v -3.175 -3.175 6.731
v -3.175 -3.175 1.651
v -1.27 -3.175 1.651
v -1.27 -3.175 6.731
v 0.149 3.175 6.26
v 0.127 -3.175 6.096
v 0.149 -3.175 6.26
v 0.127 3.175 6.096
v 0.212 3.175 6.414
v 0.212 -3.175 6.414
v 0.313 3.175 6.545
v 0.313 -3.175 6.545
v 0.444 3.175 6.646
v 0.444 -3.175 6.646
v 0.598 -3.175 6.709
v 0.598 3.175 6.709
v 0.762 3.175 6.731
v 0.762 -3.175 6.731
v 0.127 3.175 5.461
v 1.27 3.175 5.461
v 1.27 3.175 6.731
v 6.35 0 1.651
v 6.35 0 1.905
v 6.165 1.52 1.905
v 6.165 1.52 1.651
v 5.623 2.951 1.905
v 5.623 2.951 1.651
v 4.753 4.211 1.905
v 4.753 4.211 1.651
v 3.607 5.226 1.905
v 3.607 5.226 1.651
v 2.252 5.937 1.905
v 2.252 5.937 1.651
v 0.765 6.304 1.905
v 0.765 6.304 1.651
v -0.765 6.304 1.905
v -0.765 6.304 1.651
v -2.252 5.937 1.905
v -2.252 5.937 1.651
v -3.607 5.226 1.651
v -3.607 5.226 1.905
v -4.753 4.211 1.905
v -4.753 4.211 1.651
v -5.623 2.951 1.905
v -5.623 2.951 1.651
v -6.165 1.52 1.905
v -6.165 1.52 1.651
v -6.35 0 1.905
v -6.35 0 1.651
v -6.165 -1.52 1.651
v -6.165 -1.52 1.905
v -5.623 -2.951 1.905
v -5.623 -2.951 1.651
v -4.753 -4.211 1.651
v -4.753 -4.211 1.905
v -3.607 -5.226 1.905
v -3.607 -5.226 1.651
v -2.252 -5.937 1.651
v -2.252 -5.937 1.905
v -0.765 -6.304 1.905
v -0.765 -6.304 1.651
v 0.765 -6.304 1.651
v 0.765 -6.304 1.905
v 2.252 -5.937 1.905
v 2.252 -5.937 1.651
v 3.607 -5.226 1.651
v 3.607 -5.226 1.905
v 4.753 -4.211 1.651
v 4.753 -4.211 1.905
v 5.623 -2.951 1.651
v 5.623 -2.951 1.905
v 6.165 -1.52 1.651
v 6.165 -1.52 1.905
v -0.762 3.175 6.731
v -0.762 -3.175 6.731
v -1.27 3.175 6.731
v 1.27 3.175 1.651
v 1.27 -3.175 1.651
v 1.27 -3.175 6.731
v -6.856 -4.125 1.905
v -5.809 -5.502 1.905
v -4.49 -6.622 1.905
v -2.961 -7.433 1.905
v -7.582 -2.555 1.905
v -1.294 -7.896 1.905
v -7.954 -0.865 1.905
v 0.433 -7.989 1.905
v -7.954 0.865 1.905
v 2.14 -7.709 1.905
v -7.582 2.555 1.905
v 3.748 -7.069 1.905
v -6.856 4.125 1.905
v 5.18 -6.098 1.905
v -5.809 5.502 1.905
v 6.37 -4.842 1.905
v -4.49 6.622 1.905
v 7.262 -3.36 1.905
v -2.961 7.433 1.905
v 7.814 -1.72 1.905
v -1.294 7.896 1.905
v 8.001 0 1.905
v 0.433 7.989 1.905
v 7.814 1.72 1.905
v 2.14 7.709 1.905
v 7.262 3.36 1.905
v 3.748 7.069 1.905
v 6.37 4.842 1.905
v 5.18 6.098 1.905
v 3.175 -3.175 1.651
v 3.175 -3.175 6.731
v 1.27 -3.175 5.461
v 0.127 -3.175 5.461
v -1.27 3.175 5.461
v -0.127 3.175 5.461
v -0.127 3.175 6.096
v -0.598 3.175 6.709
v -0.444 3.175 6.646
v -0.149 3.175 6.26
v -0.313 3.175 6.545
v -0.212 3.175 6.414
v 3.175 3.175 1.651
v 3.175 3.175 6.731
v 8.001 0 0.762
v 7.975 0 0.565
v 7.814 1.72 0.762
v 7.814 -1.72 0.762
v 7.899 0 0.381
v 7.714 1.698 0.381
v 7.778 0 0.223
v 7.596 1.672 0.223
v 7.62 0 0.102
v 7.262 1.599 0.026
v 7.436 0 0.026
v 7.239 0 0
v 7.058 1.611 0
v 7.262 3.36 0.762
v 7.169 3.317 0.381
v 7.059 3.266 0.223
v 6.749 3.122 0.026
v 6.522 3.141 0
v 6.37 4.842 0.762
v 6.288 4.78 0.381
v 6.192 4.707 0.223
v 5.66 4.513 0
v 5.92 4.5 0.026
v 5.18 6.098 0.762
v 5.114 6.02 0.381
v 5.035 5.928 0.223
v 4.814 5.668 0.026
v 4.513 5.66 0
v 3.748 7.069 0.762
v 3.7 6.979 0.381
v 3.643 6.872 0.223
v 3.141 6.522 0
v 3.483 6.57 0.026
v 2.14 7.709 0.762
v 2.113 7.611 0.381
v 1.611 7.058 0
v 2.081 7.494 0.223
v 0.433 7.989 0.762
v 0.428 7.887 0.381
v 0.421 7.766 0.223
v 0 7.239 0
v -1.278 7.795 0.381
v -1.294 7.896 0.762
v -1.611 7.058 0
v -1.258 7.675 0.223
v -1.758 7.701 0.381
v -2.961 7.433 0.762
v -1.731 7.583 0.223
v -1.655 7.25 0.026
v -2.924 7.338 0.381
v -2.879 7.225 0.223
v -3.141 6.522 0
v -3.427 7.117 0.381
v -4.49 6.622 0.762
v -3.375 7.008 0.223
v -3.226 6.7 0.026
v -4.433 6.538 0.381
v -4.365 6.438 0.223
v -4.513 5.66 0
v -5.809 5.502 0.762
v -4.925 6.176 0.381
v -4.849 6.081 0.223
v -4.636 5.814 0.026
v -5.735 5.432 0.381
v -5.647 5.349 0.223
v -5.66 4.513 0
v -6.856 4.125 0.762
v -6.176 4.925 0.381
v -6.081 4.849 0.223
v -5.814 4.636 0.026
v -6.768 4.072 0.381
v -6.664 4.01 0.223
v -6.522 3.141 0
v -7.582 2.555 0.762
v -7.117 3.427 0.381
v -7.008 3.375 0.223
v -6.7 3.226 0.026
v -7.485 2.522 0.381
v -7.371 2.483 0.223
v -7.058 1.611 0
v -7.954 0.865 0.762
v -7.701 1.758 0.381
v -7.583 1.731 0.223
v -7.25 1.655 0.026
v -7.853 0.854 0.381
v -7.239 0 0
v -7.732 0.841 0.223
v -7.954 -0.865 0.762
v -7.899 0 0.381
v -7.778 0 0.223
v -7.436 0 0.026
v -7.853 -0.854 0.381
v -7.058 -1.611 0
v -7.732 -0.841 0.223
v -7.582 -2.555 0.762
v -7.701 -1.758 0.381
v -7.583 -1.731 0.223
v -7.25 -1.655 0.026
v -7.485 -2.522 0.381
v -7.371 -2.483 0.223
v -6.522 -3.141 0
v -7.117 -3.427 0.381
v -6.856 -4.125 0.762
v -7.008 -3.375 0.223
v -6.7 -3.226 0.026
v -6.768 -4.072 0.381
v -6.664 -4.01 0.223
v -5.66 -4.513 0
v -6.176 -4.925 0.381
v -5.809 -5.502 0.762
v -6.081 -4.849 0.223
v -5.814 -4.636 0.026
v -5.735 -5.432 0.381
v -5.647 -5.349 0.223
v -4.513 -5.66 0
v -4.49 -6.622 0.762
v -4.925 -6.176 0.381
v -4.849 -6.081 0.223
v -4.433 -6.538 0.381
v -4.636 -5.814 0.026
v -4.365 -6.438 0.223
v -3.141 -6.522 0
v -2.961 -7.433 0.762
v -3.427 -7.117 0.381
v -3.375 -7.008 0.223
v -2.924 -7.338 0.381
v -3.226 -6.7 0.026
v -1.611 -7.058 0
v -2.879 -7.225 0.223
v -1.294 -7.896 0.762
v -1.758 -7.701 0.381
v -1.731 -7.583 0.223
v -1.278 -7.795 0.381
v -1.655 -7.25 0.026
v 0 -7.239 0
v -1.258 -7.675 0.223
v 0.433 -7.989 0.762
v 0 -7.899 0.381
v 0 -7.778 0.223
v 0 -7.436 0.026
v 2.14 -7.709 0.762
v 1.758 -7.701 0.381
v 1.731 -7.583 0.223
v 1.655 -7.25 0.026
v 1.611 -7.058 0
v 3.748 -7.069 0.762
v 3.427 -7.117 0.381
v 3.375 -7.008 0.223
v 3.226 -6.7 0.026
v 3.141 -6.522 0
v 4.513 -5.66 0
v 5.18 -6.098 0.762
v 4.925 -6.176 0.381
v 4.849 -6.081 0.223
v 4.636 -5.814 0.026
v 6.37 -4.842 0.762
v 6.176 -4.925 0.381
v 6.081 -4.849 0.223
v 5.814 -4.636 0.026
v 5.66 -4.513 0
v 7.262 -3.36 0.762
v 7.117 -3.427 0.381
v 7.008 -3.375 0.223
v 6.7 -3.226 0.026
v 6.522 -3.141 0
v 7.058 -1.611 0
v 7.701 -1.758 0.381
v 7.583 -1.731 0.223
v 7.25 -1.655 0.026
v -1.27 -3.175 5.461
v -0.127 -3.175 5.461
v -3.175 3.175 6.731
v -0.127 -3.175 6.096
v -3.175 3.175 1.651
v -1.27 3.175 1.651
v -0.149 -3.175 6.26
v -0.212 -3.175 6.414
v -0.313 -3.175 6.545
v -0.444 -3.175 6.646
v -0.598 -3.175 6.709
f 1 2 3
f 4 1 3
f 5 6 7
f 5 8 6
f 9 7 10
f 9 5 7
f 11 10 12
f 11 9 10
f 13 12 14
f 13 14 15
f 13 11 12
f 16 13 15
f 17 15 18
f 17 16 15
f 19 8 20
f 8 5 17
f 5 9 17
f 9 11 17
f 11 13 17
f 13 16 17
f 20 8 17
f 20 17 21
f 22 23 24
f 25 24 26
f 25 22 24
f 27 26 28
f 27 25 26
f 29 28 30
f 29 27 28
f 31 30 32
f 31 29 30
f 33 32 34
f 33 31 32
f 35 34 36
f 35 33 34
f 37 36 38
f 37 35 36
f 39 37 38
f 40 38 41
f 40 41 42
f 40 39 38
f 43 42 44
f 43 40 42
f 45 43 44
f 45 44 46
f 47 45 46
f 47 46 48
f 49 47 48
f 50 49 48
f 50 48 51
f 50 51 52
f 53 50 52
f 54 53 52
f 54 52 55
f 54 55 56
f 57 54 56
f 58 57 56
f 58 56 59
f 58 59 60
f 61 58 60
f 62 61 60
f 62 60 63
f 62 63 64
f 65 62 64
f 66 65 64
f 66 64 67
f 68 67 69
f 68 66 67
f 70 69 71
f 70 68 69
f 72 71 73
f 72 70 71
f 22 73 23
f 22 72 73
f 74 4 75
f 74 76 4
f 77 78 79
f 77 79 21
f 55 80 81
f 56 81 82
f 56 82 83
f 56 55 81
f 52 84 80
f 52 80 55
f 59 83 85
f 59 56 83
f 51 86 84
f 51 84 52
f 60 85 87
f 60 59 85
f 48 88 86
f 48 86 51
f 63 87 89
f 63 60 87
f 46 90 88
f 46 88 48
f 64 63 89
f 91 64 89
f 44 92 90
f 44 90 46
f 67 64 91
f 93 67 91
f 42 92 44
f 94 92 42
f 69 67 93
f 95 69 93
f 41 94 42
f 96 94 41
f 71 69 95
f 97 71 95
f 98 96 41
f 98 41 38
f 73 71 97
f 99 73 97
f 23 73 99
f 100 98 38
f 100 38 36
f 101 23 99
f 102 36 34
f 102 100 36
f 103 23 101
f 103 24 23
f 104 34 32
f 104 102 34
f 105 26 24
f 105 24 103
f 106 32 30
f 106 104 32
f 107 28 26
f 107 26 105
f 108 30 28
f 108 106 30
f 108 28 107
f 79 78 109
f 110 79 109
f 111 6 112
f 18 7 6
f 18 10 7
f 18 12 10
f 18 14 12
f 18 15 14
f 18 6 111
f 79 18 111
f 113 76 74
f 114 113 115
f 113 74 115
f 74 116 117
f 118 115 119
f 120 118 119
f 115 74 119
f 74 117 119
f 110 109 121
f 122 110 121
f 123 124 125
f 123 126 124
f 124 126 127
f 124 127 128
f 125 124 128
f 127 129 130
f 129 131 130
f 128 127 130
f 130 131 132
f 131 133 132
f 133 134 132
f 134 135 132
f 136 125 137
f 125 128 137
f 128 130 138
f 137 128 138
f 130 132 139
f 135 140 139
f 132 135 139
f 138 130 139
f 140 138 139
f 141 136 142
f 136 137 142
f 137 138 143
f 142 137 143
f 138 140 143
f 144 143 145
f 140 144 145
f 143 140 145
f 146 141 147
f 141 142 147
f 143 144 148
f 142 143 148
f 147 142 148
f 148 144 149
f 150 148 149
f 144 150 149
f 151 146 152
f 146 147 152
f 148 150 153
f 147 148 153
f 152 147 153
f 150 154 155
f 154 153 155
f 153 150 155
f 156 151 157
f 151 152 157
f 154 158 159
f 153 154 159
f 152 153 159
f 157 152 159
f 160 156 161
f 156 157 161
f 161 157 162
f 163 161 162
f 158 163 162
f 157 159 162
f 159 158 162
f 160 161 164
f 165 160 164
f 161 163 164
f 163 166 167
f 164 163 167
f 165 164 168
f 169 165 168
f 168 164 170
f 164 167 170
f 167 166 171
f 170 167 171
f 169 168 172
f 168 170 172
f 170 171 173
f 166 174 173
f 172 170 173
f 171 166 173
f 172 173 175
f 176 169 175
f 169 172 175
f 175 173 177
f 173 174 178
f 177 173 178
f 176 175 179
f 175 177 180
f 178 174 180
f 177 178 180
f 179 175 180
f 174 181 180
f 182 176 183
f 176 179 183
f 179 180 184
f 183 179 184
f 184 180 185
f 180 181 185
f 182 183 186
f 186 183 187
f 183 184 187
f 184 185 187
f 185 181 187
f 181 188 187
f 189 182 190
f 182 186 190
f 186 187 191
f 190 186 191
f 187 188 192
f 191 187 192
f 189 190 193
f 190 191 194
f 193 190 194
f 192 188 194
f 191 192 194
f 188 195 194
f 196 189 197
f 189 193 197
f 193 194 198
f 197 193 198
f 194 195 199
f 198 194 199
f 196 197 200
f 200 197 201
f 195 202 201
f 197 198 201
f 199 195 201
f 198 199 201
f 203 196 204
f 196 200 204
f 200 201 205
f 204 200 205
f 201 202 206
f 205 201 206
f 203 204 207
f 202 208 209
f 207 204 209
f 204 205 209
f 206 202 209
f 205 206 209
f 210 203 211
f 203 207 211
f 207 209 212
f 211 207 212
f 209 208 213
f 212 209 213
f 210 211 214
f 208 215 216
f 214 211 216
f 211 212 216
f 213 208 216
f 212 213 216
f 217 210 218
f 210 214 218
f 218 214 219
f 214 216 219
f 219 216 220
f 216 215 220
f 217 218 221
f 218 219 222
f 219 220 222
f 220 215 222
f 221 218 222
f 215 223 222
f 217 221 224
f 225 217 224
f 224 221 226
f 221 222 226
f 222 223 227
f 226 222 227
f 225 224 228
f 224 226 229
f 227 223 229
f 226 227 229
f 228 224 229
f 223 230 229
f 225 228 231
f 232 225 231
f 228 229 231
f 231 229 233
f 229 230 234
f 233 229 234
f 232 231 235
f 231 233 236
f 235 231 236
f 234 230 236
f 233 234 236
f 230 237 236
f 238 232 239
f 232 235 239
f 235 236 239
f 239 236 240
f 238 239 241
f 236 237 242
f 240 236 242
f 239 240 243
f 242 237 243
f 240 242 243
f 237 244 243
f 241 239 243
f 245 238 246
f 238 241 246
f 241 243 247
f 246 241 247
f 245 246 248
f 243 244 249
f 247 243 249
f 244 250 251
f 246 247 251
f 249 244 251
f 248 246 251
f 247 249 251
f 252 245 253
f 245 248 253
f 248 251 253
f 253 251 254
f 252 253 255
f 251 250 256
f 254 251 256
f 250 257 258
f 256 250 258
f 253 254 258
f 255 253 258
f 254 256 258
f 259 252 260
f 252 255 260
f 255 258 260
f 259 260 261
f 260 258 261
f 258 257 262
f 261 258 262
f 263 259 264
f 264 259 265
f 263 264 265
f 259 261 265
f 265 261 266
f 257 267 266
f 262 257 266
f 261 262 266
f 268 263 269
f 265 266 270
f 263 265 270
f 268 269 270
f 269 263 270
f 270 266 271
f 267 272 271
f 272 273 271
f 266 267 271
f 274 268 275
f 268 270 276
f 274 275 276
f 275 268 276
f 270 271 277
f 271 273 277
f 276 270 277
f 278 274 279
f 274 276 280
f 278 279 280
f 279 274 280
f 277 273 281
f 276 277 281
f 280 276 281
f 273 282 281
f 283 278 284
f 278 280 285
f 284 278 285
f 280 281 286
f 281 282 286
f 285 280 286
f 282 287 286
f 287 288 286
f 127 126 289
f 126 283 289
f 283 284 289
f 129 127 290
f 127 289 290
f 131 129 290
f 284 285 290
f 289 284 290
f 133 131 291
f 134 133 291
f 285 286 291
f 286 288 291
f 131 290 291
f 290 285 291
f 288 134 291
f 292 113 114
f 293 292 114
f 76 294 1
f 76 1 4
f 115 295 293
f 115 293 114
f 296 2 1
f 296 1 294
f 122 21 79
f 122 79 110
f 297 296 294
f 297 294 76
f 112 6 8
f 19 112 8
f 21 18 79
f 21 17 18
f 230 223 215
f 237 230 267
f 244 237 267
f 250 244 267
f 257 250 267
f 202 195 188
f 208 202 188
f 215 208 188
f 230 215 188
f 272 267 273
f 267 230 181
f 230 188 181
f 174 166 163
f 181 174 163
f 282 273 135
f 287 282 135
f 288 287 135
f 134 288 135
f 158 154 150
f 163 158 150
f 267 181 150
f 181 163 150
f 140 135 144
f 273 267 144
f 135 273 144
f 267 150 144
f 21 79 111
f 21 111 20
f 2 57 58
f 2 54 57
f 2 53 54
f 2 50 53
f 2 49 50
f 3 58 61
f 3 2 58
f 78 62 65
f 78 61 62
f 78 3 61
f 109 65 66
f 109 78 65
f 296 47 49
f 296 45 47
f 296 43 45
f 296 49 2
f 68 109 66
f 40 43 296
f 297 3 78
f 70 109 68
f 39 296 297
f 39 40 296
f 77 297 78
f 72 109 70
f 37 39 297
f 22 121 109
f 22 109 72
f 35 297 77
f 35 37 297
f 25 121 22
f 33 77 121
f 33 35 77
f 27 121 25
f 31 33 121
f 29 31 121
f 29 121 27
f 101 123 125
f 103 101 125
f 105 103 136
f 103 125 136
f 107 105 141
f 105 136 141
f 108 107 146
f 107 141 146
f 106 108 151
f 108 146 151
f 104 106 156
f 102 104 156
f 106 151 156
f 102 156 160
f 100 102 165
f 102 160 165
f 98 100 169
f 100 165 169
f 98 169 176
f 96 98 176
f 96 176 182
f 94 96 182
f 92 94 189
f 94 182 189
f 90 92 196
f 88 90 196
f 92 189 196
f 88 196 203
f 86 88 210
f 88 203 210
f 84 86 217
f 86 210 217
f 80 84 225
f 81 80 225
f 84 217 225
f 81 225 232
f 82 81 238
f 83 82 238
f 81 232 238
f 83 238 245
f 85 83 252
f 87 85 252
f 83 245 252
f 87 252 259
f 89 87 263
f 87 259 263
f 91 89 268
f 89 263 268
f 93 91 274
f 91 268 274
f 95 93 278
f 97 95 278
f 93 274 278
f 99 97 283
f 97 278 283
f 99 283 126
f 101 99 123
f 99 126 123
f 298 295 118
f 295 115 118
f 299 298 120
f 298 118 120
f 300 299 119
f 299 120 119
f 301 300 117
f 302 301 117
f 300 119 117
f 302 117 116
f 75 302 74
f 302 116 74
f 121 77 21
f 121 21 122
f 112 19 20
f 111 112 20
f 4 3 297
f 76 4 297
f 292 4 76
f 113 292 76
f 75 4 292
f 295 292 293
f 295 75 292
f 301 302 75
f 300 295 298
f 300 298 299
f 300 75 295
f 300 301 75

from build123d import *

# Parameters (mm, degrees)
F0_R     = 8.001
F1_DEPTH = 1.905
F2_T     = -1.651
F3_W     = 1.905
F3_H     = 6.35
F7_DEPTH = 5.08
F8_W     = 1.143
F8_H     = 6.35
F4_W     = 1.143
F4_H     = 6.35
F9_DEPTH = 1.27
F5_R     = 0.762
F6_R     = 0.635


with BuildPart() as f1:
    # F0 (on Top) → F1 (new body)
    with BuildSketch(Plane.XY):
        Circle(F0_R)
    extrude(amount=F1_DEPTH)

    # F2
    f2_openings = [f1.faces().sort_by_distance(p)[0] for p in [
        (0, 0, 1.905),
    ]]
    offset(amount=F2_T, openings=f2_openings)

    # F3 (on face) → F7 (join)
    with BuildSketch(Plane.XY.offset(1.651)):
        with Locations((2.2225, 0)):
            Rectangle(F3_W, F3_H)
        with Locations((-2.2225, 0)):
            Rectangle(F3_W, F3_H)
    extrude(amount=F7_DEPTH)

    # F5
    f5_edges = [f1.edges().sort_by_distance(p)[0] for p in [
        (-8.001, 0, 0),
    ]]
    fillet(f5_edges, radius=F5_R)


with BuildPart() as f9:
    # F8 (on face) + F4 (on face) → F9 (new body)
    with BuildSketch(Plane.XY.offset(6.731)):
        with Locations((0.6985, 0)):
            Rectangle(F8_W, F8_H)
    with BuildSketch(Plane.XY.offset(6.731)):
        with Locations((-0.6985, 0)):
            Rectangle(F4_W, F4_H)
    extrude(amount=-F9_DEPTH)

    # F6
    f6_edges = [f9.edges().sort_by_distance(p)[0] for p in [
        (-0.127, 0, 6.731),
        (0.127, 0, 6.731),
    ]]
    fillet(f6_edges, radius=F6_R)


solid = Compound([f1.part, f9.part])
